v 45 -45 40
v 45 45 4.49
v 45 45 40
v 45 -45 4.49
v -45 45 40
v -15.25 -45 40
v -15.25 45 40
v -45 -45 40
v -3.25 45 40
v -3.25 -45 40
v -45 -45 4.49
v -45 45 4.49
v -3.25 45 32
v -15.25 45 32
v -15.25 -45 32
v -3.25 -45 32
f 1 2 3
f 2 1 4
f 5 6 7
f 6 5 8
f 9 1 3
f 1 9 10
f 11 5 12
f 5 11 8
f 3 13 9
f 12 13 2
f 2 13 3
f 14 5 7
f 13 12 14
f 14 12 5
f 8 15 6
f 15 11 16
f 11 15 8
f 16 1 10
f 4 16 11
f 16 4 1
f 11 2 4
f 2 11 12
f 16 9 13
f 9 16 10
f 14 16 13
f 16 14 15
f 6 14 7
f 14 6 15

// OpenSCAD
// Magnetic stirrer housing for 80 mm PC case fan
// Print orientation: top plate on bed (z = 0), walls build upward (+Z)

// ---------- Dimensions ----------
plate_t      = 2;     // top plate thickness
wall_t       = 2.5;   // wall thickness
box_h        = 40;    // total height of box (open top at z = 40)
outer_x      = 90;    // outer size in X
outer_y      = 90;    // outer size in Y
hole_d       = 4.5;   // M4 screw hole diameter
hole_pitch   = 71.5;  // square pattern centre-to-centre spacing
notch_w      = 12;    // cable notch width
notch_depth  = 8;     // notch depth from open edge (z = 32 to 40)
eps          = 0.5;   // cutter overshoot past faces

$fn = 64;

// ---------- Model ----------
difference() {
    // Outer block
    translate([-outer_x/2, -outer_y/2, 0])
        cube([outer_x, outer_y, box_h]);

    // Open top (hollow interior)
    translate([-outer_x/2, -outer_y/2, 0])
        cube([outer_x, outer_y, plate_t + wall_t - 0.01]);

    // Screw holes through top plate
    for (sx = [-1, 1], sy = [-1, 1])
        translate([sx * hole_pitch/2, sy * hole_pitch/2, -eps])
            cylinder(d = hole_d, h = plate_t + 2*eps);

    // Cable notch in one wall (along +X, centred)
    translate([-outer_x/2 + hole_pitch/2 - notch_w/2, -outer_y/2, box_h - notch_depth])
        cube([notch_w, outer_y + 2*eps, notch_depth + eps]);
}
